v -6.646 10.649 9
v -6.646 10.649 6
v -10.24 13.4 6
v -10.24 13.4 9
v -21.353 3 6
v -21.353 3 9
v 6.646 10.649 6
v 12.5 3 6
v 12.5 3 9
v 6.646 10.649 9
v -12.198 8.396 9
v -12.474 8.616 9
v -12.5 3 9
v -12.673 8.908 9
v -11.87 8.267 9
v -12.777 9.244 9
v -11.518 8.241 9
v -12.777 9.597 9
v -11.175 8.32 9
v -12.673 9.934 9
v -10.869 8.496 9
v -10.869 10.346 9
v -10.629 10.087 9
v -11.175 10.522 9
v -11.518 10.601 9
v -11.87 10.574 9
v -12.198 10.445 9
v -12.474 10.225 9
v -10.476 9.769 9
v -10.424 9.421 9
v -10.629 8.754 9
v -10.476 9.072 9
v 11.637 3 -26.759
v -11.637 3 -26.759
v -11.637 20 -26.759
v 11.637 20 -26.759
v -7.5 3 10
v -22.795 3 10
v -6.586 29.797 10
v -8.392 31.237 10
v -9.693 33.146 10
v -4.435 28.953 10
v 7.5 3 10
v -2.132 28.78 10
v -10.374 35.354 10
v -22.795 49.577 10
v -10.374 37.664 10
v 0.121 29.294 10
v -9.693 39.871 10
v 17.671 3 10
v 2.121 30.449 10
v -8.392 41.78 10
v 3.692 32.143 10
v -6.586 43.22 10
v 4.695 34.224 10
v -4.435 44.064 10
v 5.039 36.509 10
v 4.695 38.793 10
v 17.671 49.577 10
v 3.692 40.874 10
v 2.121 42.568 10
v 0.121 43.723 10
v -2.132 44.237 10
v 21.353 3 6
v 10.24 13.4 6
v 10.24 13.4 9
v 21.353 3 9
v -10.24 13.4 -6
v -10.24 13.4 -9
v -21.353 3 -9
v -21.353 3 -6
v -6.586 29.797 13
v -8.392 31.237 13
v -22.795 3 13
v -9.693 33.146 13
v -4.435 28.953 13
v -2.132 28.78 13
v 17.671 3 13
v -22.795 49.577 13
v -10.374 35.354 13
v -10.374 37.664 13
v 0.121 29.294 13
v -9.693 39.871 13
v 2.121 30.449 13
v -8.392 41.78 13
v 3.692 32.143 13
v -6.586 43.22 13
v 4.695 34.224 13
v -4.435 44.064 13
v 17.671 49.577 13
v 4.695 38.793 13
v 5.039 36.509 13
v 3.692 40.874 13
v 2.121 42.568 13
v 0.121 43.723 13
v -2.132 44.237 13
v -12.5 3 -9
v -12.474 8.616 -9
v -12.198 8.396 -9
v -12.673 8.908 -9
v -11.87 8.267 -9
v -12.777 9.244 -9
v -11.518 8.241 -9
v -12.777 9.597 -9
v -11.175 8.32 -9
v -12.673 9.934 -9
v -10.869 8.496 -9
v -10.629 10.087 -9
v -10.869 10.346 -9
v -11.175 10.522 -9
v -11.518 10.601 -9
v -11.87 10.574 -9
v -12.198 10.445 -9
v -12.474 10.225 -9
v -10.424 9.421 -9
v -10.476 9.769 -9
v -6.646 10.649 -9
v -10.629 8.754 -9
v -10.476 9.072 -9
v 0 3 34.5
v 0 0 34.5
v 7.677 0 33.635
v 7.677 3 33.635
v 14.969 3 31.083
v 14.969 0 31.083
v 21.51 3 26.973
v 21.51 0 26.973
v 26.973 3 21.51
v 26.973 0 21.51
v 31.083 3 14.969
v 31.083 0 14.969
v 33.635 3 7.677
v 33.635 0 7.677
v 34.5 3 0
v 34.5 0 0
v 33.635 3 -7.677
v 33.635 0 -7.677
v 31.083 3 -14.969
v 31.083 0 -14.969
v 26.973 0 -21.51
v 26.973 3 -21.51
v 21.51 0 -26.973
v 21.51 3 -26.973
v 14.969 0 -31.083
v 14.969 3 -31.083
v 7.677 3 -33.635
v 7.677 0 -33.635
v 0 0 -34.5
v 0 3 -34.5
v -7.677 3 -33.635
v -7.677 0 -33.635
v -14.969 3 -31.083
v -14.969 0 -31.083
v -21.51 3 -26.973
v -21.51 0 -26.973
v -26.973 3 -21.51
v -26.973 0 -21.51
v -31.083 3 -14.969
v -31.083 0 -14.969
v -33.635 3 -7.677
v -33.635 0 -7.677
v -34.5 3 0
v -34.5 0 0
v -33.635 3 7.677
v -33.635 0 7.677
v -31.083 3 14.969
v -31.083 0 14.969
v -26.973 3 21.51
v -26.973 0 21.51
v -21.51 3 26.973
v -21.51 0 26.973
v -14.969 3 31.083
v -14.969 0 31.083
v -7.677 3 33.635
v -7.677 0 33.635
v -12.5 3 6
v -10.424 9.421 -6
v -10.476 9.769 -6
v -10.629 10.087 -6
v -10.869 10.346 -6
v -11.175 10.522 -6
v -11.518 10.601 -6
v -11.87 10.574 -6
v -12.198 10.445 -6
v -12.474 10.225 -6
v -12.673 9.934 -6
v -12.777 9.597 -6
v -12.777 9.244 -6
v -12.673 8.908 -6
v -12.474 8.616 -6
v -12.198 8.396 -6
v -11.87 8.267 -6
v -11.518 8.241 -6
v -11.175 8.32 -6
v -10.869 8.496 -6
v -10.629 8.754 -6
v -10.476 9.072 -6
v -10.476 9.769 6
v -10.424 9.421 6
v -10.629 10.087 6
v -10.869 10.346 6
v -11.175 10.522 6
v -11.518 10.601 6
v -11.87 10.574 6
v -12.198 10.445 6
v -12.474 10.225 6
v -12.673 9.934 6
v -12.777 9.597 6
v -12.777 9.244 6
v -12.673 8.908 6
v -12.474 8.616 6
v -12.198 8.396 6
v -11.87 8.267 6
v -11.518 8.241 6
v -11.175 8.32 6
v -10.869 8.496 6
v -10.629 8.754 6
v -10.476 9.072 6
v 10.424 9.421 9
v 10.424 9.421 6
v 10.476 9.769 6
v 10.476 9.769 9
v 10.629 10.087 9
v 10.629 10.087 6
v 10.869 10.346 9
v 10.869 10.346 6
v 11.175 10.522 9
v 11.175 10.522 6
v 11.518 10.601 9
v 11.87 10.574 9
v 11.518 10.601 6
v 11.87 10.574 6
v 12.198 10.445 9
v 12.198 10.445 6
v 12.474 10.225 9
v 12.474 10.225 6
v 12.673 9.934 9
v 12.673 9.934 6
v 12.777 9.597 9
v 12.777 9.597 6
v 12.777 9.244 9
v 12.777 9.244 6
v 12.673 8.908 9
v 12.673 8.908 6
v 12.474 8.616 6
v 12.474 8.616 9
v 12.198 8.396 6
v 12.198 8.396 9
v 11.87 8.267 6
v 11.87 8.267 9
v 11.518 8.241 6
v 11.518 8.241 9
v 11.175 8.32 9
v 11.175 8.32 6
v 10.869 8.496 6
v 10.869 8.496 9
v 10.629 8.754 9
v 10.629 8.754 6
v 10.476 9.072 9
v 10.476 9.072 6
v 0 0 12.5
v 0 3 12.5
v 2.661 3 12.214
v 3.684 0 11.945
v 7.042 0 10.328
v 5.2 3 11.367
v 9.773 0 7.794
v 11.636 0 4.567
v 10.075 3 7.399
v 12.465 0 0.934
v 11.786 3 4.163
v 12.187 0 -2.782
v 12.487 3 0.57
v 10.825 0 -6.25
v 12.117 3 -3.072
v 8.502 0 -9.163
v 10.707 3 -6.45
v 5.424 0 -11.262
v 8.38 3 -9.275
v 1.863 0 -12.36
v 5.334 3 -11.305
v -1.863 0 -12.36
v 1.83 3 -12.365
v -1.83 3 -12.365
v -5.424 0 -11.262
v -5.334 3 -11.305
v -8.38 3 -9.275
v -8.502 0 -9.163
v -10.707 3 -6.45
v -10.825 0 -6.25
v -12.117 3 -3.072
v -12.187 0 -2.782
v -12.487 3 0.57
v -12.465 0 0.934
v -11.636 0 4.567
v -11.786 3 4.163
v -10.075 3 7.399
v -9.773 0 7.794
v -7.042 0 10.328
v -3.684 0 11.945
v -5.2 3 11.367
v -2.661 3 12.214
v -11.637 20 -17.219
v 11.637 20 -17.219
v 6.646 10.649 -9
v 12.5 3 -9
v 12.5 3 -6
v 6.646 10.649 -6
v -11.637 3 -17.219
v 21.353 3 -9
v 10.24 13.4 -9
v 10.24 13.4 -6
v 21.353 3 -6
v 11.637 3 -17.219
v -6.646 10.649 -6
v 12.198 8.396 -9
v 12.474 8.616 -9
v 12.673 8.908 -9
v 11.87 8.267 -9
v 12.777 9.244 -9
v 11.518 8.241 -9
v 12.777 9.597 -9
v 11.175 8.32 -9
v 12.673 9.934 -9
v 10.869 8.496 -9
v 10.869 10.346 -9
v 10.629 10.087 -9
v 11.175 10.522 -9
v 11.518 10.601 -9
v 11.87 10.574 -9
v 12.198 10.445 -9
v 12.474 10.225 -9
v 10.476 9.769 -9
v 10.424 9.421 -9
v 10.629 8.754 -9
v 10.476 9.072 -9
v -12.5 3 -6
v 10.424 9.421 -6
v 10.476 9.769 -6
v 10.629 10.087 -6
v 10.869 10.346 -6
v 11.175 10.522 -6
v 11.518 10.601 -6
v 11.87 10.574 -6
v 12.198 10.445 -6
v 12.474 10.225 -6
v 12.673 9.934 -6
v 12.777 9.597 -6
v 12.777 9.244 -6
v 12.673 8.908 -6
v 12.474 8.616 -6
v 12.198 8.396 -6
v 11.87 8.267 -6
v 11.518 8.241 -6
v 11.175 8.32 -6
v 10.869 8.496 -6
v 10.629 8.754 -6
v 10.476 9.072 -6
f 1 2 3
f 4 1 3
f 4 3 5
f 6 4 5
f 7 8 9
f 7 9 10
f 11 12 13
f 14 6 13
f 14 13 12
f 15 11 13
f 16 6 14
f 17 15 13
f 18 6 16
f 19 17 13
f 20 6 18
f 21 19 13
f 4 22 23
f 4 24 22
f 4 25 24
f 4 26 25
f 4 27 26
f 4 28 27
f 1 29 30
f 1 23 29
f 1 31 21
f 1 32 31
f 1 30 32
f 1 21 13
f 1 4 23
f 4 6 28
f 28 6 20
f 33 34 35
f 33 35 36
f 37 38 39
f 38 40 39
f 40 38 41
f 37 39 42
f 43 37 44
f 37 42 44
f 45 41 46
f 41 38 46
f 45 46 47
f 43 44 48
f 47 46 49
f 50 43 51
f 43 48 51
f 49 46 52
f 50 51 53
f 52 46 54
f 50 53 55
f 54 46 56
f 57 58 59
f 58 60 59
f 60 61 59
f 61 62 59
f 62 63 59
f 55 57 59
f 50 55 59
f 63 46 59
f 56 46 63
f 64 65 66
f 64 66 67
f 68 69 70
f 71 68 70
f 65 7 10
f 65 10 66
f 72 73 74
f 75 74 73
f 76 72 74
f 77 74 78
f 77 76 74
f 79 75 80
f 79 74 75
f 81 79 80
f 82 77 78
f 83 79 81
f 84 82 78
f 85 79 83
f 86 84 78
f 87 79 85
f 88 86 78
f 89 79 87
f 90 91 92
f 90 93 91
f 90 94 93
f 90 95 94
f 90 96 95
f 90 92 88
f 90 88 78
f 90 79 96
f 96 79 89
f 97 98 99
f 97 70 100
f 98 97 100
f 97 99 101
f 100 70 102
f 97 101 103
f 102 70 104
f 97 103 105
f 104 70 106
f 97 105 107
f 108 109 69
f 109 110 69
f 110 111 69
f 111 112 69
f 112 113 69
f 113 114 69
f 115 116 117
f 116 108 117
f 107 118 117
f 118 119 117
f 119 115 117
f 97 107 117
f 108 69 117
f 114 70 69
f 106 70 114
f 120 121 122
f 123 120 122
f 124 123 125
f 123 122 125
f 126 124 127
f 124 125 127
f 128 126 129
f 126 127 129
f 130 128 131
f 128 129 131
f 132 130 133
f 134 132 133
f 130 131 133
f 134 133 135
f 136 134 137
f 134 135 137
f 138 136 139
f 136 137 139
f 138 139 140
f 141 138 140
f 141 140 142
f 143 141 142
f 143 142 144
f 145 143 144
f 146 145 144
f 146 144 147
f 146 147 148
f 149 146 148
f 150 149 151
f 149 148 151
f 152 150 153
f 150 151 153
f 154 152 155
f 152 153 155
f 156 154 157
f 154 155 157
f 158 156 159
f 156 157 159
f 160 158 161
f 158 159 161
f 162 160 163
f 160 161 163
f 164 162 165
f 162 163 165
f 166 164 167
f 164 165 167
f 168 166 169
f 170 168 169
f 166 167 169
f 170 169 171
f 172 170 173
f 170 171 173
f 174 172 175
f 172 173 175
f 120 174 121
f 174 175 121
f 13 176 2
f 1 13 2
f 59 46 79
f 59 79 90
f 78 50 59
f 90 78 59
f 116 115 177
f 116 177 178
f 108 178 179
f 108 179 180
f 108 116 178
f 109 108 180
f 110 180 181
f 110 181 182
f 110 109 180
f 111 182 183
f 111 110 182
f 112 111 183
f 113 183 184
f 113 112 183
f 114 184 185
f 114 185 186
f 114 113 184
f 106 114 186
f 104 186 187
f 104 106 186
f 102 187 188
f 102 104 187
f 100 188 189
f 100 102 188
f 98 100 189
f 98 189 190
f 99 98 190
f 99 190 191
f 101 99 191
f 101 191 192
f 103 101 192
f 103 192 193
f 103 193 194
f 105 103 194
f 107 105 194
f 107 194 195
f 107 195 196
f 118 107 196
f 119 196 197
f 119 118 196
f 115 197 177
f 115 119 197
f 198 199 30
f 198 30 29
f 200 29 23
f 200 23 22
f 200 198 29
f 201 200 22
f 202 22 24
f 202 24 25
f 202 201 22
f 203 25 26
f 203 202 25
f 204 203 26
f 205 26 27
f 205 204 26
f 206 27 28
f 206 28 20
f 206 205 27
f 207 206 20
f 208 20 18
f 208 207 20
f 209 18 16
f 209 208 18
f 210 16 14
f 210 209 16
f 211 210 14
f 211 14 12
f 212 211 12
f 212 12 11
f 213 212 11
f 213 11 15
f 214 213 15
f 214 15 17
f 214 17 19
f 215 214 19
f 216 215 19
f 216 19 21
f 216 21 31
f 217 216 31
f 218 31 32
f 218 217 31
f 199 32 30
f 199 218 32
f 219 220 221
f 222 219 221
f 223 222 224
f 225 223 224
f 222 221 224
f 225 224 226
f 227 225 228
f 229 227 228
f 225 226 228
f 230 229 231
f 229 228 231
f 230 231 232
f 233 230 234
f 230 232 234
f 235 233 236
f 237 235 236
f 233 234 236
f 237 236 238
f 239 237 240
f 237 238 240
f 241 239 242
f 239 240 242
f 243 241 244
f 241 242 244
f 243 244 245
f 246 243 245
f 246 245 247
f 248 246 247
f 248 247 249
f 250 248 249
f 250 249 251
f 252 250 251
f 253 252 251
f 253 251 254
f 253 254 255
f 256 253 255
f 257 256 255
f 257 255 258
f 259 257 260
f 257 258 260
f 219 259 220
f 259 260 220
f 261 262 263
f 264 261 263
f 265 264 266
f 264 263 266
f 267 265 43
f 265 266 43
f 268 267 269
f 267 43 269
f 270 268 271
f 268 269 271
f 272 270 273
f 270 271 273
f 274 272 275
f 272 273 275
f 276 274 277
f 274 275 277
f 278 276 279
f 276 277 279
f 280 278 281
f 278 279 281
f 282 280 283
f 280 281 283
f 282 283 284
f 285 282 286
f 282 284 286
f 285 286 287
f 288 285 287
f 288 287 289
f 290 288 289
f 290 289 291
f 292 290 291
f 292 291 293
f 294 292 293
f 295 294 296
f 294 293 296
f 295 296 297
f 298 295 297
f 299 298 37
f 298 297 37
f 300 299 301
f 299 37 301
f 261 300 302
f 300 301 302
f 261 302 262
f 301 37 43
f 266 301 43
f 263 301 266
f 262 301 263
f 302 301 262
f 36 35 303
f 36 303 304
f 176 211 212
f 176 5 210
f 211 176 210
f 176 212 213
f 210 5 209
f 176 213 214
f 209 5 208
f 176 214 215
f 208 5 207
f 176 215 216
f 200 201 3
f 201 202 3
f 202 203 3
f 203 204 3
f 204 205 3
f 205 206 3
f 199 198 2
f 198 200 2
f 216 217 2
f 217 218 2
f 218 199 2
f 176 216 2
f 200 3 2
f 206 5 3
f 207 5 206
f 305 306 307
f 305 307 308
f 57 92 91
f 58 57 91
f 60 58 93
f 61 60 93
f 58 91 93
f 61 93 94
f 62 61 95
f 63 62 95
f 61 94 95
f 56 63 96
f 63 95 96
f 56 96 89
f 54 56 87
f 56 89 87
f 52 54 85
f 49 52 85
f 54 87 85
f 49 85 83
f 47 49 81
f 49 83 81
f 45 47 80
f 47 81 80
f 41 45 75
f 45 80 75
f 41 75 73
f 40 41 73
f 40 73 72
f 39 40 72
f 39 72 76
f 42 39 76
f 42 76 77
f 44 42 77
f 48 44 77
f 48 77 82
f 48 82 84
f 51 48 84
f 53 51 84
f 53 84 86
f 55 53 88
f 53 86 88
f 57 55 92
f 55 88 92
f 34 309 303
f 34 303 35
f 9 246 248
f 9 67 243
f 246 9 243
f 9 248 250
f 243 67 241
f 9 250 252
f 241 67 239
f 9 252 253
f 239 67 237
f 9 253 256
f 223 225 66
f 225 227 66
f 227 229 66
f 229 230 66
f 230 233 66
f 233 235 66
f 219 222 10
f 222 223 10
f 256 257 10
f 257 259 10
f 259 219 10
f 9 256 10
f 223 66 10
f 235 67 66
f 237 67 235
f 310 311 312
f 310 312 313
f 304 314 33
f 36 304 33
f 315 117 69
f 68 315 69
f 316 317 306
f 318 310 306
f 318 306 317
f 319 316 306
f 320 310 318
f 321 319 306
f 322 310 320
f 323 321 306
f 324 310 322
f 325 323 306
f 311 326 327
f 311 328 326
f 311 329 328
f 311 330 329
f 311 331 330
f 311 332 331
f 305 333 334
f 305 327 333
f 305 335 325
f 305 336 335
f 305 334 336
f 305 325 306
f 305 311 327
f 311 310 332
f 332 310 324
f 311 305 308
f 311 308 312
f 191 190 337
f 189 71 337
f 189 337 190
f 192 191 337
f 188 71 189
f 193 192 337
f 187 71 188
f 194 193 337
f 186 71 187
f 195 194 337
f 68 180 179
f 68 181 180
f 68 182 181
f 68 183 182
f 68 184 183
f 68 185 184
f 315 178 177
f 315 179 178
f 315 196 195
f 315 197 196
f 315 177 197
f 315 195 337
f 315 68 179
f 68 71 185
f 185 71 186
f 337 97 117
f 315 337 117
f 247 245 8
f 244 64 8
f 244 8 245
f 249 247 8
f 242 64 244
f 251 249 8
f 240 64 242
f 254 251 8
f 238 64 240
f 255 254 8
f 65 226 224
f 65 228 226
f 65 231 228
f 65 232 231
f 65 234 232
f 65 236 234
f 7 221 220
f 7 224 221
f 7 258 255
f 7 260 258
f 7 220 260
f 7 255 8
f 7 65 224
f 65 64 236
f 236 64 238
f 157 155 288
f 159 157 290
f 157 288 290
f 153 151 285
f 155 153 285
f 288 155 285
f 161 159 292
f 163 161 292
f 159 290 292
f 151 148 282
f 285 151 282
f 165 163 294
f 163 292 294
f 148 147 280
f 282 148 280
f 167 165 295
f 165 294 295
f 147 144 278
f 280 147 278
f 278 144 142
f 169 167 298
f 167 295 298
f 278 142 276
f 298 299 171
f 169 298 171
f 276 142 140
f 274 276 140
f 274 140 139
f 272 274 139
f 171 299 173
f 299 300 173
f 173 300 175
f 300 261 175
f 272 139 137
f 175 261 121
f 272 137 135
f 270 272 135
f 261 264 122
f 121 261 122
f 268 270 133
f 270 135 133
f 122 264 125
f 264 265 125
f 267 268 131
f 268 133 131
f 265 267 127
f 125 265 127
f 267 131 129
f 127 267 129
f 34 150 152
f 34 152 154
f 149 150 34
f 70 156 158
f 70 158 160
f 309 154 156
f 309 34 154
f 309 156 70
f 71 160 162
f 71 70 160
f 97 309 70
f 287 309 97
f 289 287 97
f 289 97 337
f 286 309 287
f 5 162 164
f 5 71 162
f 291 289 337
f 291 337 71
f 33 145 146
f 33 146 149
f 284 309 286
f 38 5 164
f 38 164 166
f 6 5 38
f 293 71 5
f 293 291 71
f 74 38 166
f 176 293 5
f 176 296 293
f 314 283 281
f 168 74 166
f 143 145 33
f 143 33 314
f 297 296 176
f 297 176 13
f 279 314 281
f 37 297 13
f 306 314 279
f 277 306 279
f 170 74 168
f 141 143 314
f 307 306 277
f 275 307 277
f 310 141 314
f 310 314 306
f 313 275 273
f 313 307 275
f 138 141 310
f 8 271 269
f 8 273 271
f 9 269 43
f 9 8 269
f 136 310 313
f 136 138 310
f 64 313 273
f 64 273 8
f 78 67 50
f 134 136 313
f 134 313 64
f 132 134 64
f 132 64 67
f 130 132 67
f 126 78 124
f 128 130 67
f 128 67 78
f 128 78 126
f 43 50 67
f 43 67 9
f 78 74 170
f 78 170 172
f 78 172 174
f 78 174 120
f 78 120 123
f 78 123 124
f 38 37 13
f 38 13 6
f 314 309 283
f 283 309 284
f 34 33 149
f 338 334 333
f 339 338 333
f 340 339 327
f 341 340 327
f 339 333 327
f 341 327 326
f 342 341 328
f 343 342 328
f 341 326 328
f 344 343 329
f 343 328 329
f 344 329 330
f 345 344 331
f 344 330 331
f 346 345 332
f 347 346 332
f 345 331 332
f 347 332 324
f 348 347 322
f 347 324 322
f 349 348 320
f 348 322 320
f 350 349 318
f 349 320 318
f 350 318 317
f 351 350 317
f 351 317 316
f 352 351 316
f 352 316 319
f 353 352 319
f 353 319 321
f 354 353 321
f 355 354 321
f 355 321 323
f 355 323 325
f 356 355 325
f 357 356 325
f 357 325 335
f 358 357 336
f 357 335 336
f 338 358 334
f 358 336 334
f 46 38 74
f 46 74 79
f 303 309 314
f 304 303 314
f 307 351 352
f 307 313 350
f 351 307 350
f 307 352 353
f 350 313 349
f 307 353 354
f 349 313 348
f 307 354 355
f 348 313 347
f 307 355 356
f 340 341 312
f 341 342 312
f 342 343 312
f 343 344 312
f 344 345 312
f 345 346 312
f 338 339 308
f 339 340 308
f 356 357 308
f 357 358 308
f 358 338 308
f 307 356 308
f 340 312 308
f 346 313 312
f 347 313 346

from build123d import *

# Parameters (mm, degrees)
SKETCH_1_R          = 34.5
EXTRUDE_1_DEPTH     = 3
SKETCH_2_R          = 12.5
CUT_EXTRUDE_1_DEPTH = 3
EXTRUDE_START       = 6
SKETCH_3_R          = 1.183017338
EXTRUDE_2_DEPTH     = 3
EXTRUDE_START_2     = -9
SKETCH_3_2_R        = 1.183017338
EXTRUDE_3_DEPTH     = 3
EXTRUDE_START_3     = 10
SKETCH_4_W          = 40.46646749
SKETCH_4_H          = 46.577480255
EXTRUDE_6_DEPTH     = 3
SKETCH_5_R          = 7.75
CUT_EXTRUDE_2_DEPTH = 3
SKETCH_6_W          = 23.274927202
SKETCH_6_H          = 9.540013766
EXTRUDE_7_DEPTH     = 17


with BuildPart() as part:
    # 草图1 → 凸台-拉伸1 (new body)
    with BuildSketch(Plane(origin=(0, 0, 0), x_dir=(1, 0, 0), z_dir=(0, 1, 0))):
        Circle(SKETCH_1_R)
    extrude(amount=EXTRUDE_1_DEPTH)

    # 草图2 → 切除-拉伸1 (cut)
    with BuildSketch(Plane(origin=(0, 3, 0), x_dir=(1, 0, 0), z_dir=(0, 1, 0))):
        Circle(SKETCH_2_R)
    extrude(amount=-CUT_EXTRUDE_1_DEPTH, mode=Mode.SUBTRACT)

    # 草图3 → 凸台-拉伸2 (add)
    with BuildSketch(Plane.XY.offset(EXTRUDE_START)):
        Polygon((-12.5, 3), (-6.645761315, 10.649339614), (-10.240290901, 13.400326656), (-21.352795206, 3), align=None)
        with Locations((-11.606709205, 9.420794795)):
            Circle(SKETCH_3_R, mode=Mode.SUBTRACT)
    extrude_2 = extrude(amount=EXTRUDE_2_DEPTH)

    # 草图3<2> → 凸台-拉伸3 (add)
    with BuildSketch(Plane.XY.offset(EXTRUDE_START_2)):
        Polygon((-12.5, 3), (-6.645761315, 10.649339614), (-10.240290901, 13.400326656), (-21.352795206, 3), align=None)
        with Locations((-11.606709205, 9.420794795)):
            Circle(SKETCH_3_2_R, mode=Mode.SUBTRACT)
    extrude_3 = extrude(amount=EXTRUDE_3_DEPTH)

    # 镜向1: 凸台-拉伸2, 凸台-拉伸3 across plane
    add(extrude_2.mirror(Plane(origin=(0, 0, 0), x_dir=(0, 0, 1), z_dir=(1, 0, 0))))
    add(extrude_3.mirror(Plane(origin=(0, 0, 0), x_dir=(0, 0, 1), z_dir=(1, 0, 0))))

    # 草图4 → 凸台-拉伸6 (add)
    with BuildSketch(Plane.XY.offset(EXTRUDE_START_3)):
        with Locations((-2.561924873, 26.288740128)):
            Rectangle(SKETCH_4_W, SKETCH_4_H)
    extrude(amount=EXTRUDE_6_DEPTH)

    # 草图5 → 切除-拉伸2 (cut)
    with BuildSketch(Plane.XY.offset(13)):
        with Locations((-2.710861026, 36.508686197)):
            Circle(SKETCH_5_R)
    extrude(amount=-CUT_EXTRUDE_2_DEPTH, mode=Mode.SUBTRACT)

    # 草图6 → 凸台-拉伸7 (add)
    with BuildSketch(Plane(origin=(0, 3, 0), x_dir=(1, 0, 0), z_dir=(0, 1, 0))):
        with Locations((0, 21.989393432)):
            Rectangle(SKETCH_6_W, SKETCH_6_H)
    extrude(amount=EXTRUDE_7_DEPTH)


solid = part.part
